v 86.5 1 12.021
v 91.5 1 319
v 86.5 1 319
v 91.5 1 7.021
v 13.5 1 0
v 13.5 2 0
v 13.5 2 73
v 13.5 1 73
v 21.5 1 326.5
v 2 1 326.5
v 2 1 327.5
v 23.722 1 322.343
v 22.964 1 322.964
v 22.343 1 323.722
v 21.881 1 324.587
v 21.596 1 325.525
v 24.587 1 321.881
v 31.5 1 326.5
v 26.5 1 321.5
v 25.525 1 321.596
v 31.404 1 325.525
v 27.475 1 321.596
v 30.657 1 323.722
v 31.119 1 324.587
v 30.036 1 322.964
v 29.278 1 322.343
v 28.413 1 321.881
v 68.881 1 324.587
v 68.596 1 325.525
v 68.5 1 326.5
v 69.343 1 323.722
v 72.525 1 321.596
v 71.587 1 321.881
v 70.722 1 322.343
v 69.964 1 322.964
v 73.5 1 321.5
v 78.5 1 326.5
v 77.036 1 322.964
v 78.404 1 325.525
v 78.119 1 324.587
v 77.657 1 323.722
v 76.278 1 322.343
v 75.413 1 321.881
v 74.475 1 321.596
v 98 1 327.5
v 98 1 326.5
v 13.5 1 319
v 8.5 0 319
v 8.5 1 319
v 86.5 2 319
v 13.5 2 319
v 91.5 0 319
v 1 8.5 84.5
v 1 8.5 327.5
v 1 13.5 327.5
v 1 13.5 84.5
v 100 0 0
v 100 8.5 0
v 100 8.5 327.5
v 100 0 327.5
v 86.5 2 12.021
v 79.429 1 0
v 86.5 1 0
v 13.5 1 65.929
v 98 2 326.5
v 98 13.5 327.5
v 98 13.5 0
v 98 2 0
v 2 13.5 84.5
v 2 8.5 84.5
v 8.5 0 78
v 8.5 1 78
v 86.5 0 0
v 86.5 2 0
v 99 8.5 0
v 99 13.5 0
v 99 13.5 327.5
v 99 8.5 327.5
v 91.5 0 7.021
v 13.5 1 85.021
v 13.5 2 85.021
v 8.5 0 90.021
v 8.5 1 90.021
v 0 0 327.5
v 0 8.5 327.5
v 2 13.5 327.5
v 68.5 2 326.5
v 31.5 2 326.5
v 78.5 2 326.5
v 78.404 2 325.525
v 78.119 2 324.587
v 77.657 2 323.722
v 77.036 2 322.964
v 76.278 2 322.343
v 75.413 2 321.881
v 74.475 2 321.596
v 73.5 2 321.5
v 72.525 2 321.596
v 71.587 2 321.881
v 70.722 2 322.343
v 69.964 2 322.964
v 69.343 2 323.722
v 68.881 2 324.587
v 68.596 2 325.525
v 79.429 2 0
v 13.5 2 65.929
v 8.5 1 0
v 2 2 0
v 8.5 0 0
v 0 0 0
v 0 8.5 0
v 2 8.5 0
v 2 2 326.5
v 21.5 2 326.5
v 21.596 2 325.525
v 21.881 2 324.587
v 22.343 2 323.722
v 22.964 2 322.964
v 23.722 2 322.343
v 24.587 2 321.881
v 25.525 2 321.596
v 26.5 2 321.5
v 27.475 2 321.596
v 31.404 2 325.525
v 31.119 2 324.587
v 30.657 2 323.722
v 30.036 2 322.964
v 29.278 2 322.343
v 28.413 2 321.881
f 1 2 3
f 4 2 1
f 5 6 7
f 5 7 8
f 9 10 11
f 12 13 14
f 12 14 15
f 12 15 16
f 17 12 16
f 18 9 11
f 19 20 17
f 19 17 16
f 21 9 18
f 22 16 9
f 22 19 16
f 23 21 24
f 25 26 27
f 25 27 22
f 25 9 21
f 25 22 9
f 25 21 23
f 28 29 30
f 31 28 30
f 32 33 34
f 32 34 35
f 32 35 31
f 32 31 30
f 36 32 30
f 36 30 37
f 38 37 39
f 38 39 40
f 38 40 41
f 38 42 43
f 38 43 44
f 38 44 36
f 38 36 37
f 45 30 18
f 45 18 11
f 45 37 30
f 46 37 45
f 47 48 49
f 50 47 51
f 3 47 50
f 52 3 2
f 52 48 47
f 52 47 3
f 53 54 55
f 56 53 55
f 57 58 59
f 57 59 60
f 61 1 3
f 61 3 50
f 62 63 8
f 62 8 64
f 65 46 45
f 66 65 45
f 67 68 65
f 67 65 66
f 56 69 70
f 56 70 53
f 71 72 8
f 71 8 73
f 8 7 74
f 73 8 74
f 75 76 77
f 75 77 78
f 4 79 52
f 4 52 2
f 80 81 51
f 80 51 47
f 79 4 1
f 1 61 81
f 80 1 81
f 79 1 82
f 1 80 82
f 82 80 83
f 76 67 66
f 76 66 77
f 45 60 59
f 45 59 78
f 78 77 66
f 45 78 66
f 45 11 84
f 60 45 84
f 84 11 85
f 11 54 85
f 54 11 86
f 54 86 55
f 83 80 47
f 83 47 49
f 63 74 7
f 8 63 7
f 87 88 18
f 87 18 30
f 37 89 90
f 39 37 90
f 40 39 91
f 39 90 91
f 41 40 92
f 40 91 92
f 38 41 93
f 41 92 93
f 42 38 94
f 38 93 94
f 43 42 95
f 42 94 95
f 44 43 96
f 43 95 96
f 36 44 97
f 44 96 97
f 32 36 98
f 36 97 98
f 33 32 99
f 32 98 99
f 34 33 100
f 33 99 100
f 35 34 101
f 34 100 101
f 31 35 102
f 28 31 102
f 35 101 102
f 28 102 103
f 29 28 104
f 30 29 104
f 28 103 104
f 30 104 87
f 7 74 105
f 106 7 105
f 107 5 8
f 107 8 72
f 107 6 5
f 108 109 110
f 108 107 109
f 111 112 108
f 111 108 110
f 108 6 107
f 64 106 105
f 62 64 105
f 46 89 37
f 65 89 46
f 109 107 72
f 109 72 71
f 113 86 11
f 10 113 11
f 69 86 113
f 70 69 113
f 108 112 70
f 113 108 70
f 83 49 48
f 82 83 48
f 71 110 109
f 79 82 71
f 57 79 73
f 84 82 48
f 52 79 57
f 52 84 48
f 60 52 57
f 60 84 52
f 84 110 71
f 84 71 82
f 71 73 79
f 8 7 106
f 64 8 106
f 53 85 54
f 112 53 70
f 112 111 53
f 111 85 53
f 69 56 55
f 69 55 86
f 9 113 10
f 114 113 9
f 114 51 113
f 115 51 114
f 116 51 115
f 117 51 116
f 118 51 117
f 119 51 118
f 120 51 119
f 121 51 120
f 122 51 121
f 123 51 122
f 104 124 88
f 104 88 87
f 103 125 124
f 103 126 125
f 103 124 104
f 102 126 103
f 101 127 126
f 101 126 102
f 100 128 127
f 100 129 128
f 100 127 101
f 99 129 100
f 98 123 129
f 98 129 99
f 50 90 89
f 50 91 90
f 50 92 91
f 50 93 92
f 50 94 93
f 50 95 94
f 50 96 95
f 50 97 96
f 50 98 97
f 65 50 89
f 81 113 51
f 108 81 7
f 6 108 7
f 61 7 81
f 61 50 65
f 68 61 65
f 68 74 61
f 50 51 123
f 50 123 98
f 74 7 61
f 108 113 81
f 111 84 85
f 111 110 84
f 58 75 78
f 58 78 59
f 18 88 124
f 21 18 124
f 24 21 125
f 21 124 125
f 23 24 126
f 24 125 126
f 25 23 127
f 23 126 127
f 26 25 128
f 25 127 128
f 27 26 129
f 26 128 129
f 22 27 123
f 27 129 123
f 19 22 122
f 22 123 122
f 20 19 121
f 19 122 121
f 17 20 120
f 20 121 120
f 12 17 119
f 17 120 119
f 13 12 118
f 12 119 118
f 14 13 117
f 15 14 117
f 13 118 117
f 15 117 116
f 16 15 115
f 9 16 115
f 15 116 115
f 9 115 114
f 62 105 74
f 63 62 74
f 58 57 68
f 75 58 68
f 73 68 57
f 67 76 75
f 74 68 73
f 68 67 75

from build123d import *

# Parameters (mm, degrees)
BOSS_EXTRUDE1_DEPTH   = 327.5
BOSS_EXTRUDE1_2_DEPTH = 327.5
BOSS_EXTRUDE2_DEPTH   = 2
BOSS_EXTRUDE4_DEPTH   = 1
SKETCH4_W             = 100
SKETCH4_H             = 8.5
BOSS_EXTRUDE5_DEPTH   = 2
BOSS_EXTRUDE6_DEPTH   = 1
SKETCH6_R             = 5
SKETCH6_W             = 96
SKETCH6_H             = 1
CUT_EXTRUDE1_DEPTH    = 1
SKETCH7_W             = 1
SKETCH7_H             = 5
CUT_EXTRUDE2_DEPTH    = 84.5


with BuildPart() as part:
    # Sketch1 → Boss-Extrude1 (new body)
    with BuildSketch(Plane.XY):
        Polygon((0, 0), (0, 8.5), (1, 8.5), (1, 13.5), (2, 13.5), (2, 2), (13.5, 2), (13.5, 1), (8.5, 1), (8.5, 0), align=None)
    extrude(amount=BOSS_EXTRUDE1_DEPTH)



with BuildPart() as body_2:
    # Sketch1 → Boss-Extrude1 2 (new body)
    with BuildSketch(Plane.XY):
        Polygon((100, 0), (91.5, 0), (91.5, 1), (86.5, 1), (86.5, 2), (98, 2), (98, 13.5), (99, 13.5), (99, 8.5), (100, 8.5), align=None)
    extrude(amount=BOSS_EXTRUDE1_2_DEPTH)


with BuildPart() as part_1:
    add(part.part)

    add(body_2.part)  # Boss-Extrude2 merges body 2
    # Sketch2 → Boss-Extrude2 (add)
    with BuildSketch(Plane(origin=(0, 2, 0), x_dir=(1, 0, 0), z_dir=(0, 1, 0))):
        Polygon((86.5, 0), (13.5, -73), (13.5, -85.02081528), (86.5, -12.02081528), align=None)
    extrude(amount=-BOSS_EXTRUDE2_DEPTH)

    # Sketch3 → Boss-Extrude4 (add)
    with BuildSketch(Plane.XZ.offset(-1)):
        Polygon((13.5, 73), (13.5, 85.02081528), (8.5, 90.02081528), (8.5, 78), align=None)
        Polygon((86.5, 0), (86.5, 12.02081528), (91.5, 7.02081528), (91.5, 0), align=None)
    extrude(amount=BOSS_EXTRUDE4_DEPTH)

    # Sketch4 → Boss-Extrude5 (add)
    with BuildSketch(Plane.XZ):
        with Locations((50, 323.25)):
            Rectangle(SKETCH4_W, SKETCH4_H)
    extrude(amount=-BOSS_EXTRUDE5_DEPTH)

    # Sketch6 → Cut-Extrude1 (cut)
    with BuildSketch(Plane(origin=(0, 2, 0), x_dir=(1, 0, 0), z_dir=(0, 1, 0))):
        with Locations((26.5, -326.5)):
            Circle(SKETCH6_R)
        with Locations((73.5, -326.5)):
            Circle(SKETCH6_R)
        with Locations((50, -327)):
            Rectangle(SKETCH6_W, SKETCH6_H)
    extrude(amount=-CUT_EXTRUDE1_DEPTH, mode=Mode.SUBTRACT)

    # Sketch7 → Cut-Extrude2 (cut)
    with BuildSketch(Plane(origin=(0, 0, 0), x_dir=(-1, 0, 0), z_dir=(0, 0, -1))):
        with Locations((-1.5, 11)):
            Rectangle(SKETCH7_W, SKETCH7_H)
    extrude(amount=-CUT_EXTRUDE2_DEPTH, mode=Mode.SUBTRACT)


with BuildPart() as body_2_2:
    # Sketch5 → Boss-Extrude6 (new body)
    with BuildSketch(Plane(origin=(0, 2, 0), x_dir=(1, 0, 0), z_dir=(0, 1, 0))):
        Polygon((13.5, -65.928932188), (79.428932188, 0), (86.5, 0), (13.5, -73), align=None)
    extrude(amount=-BOSS_EXTRUDE6_DEPTH)


solid = Compound([part_1.part, body_2_2.part])
